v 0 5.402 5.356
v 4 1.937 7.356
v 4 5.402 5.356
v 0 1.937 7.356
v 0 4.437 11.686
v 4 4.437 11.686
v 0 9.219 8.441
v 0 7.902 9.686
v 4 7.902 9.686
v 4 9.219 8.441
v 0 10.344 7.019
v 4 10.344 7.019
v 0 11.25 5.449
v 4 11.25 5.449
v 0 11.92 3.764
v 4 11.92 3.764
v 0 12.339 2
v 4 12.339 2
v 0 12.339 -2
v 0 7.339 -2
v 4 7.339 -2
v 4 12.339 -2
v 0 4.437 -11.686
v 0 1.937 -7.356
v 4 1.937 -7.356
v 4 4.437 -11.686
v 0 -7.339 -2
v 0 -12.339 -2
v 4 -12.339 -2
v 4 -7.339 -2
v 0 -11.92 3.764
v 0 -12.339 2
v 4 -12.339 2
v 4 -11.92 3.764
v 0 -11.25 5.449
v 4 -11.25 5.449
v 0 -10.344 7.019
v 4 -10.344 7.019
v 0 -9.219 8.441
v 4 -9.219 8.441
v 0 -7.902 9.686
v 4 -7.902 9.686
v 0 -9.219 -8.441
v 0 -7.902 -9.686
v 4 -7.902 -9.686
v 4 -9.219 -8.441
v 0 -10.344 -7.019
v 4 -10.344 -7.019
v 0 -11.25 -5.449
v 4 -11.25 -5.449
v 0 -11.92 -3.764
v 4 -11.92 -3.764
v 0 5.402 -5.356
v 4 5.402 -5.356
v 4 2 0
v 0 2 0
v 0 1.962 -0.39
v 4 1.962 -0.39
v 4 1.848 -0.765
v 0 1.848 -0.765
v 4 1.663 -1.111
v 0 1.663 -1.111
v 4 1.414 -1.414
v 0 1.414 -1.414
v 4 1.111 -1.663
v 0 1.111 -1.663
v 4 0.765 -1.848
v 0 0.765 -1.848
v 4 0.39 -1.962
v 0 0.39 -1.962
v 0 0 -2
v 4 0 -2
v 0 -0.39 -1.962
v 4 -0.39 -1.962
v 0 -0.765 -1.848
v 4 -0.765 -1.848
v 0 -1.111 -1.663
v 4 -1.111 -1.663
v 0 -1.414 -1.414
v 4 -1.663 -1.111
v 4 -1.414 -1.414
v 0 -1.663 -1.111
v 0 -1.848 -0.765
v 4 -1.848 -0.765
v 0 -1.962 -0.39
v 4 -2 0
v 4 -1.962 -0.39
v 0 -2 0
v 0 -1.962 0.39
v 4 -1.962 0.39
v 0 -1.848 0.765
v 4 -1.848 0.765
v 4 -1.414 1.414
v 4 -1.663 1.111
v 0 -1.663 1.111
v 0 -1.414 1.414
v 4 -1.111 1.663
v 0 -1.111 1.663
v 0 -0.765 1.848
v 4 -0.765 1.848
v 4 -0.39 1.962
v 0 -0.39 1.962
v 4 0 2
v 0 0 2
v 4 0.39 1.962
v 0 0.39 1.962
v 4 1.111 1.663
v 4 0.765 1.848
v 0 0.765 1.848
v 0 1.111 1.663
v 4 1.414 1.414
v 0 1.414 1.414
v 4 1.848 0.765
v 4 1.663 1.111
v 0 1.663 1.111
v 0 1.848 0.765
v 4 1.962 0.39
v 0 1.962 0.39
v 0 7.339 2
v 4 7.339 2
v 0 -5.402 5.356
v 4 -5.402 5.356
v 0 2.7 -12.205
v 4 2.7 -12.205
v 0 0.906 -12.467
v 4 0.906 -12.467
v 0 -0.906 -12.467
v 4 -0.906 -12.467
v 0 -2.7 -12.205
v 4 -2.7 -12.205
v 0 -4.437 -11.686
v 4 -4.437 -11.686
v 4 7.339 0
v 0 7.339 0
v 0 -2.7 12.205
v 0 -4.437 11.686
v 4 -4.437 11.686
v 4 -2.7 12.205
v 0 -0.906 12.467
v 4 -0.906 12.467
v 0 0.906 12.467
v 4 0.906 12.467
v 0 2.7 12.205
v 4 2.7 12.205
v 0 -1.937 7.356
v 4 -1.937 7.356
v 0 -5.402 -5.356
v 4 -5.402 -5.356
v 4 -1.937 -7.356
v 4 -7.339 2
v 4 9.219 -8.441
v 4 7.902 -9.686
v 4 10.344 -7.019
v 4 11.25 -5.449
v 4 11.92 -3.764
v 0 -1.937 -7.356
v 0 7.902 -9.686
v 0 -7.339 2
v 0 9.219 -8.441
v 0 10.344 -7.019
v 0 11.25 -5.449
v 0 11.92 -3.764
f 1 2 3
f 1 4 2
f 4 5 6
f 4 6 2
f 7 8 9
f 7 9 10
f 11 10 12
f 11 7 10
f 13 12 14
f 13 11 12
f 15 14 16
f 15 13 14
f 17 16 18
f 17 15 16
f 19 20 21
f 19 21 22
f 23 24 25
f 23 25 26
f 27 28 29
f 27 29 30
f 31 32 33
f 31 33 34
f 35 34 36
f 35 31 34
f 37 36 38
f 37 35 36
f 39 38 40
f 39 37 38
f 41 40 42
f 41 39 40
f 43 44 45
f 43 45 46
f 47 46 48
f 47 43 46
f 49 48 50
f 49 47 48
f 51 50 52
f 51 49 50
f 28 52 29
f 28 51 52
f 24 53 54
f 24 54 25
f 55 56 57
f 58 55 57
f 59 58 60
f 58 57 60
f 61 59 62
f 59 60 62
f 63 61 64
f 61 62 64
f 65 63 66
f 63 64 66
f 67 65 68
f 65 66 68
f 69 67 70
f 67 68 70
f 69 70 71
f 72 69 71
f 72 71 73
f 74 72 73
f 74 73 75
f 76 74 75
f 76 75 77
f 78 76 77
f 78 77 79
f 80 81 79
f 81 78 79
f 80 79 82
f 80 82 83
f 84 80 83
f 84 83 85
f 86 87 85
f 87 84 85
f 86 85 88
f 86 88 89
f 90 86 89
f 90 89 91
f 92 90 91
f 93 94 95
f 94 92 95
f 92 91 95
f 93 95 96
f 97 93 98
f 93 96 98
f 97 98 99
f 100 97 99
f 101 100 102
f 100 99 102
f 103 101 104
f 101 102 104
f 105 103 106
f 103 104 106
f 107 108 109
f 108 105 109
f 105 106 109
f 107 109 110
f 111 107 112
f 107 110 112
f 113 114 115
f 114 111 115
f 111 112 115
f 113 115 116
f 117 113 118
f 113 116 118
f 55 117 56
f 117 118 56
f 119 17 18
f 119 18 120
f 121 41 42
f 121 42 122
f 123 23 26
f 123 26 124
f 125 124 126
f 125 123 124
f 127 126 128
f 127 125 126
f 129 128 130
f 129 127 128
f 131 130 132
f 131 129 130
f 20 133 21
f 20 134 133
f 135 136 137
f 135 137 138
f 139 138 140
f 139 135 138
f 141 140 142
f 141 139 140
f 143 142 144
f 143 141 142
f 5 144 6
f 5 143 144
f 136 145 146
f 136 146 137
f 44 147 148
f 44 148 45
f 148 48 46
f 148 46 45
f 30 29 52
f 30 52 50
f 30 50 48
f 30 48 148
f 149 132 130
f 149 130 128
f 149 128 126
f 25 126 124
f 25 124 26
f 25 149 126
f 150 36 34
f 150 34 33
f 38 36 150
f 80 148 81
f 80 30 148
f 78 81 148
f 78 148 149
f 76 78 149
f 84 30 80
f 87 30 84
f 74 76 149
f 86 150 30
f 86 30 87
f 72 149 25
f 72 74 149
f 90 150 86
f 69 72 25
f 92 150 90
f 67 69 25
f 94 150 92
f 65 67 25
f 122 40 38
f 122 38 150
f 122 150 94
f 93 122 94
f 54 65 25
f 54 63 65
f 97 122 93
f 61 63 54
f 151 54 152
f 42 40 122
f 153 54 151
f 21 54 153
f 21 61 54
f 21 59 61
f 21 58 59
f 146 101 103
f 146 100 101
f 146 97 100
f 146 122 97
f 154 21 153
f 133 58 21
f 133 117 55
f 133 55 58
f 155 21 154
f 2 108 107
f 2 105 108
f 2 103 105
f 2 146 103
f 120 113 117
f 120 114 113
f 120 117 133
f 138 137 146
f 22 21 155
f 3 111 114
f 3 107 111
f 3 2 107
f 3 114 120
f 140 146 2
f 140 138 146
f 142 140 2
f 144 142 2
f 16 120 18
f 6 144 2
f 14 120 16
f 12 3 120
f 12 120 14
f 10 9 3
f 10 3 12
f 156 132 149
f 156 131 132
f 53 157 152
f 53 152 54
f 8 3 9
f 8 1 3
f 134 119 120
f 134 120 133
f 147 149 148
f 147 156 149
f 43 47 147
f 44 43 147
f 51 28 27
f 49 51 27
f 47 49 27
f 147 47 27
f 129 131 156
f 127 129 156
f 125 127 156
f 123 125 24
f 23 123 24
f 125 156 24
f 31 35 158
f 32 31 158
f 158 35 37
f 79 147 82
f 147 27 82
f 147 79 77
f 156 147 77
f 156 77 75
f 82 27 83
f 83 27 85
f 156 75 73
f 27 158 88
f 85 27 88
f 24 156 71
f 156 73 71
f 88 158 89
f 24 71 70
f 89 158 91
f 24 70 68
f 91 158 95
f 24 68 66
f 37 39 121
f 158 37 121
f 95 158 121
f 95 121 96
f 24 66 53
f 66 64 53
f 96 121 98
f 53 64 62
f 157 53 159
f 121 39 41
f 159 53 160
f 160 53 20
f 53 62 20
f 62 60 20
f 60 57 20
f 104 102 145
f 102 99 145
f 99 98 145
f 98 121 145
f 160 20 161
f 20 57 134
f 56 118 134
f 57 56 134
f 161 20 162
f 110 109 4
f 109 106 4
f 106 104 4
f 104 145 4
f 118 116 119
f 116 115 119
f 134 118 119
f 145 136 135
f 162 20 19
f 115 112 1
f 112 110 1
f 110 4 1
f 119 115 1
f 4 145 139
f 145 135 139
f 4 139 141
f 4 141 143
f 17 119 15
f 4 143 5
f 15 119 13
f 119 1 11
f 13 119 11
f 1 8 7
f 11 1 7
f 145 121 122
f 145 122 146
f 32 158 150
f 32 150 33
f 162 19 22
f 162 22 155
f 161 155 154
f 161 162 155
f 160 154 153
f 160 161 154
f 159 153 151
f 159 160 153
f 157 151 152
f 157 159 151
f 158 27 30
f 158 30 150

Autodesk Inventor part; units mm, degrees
ref_plane "YZ Plane" through (0, 0, 0) normal (1, 0, 0) x (0, 1, 0)
ref_plane "XZ Plane" through (0, 0, 0) normal (0, 1, 0) x (-1, 0, 0)
ref_plane "XY Plane" through (0, 0, 0) normal (0, 0, 1) x (1, 0, 0)
sketch "Эскиз1" plane through (0, 0, 0) normal (1, 0, 0) x (0, 1, 0)
  circle A0 centre (0, 0) radius 12.5
  line L0 (12.339, 2) -> (7.339, 2)
  line L1 (7.339, 2) -> (7.339, -2)
  line L2 (7.339, -2) -> (12.339, -2)
  line L3 (12.5, 0) -> (0, 0)
  line L4 (4.4374, 11.6859) -> (1.9374, 7.3557)
  line L5 (1.9374, 7.3557) -> (5.4015, 5.3557)
  line L6 (5.4015, 5.3557) -> (7.9015, 9.6859)
  line L7 (-7.9015, 9.6859) -> (-5.4015, 5.3557)
  line L8 (-5.4015, 5.3557) -> (-1.9374, 7.3557)
  line L9 (-1.9374, 7.3557) -> (-4.4374, 11.6859)
  line L10 (-12.339, -2) -> (-7.339, -2)
  line L11 (-7.339, -2) -> (-7.339, 2)
  line L12 (-7.339, 2) -> (-12.339, 2)
  line L13 (-4.4374, -11.6859) -> (-1.9374, -7.3557)
  line L14 (-1.9374, -7.3557) -> (-5.4015, -5.3557)
  line L15 (-5.4015, -5.3557) -> (-7.9015, -9.6859)
  line L16 (7.9015, -9.6859) -> (5.4015, -5.3557)
  line L17 (5.4015, -5.3557) -> (1.9374, -7.3557)
  line L18 (1.9374, -7.3557) -> (4.4374, -11.6859)
  circle A1 centre (0, 0) radius 2
  point P0 (4.4374, 11.6859)
  point P1 (-12.339, 2)
  point P2 (-12.339, -2)
  point P3 (-7.9015, -9.6859)
  point P4 (-4.4374, -11.6859)
  point P5 (4.4374, -11.6859)
  point P6 (7.9015, 9.6859)
  dimension "d2" = 360
  dimension "d4" = 5
  dimension "d5" = 25
  dimension "d8" = 4
  dimension "d9" = 4
extrude "Выдавливание1" add sketch "Эскиз1" along normal blind 4 contours L0 L1 L2 A0 L16 L17 L18 L13 L14 L15 L10 L11 L12 L7 L8 L9 L4 L5 L6
properties part number "barrel_holder"
